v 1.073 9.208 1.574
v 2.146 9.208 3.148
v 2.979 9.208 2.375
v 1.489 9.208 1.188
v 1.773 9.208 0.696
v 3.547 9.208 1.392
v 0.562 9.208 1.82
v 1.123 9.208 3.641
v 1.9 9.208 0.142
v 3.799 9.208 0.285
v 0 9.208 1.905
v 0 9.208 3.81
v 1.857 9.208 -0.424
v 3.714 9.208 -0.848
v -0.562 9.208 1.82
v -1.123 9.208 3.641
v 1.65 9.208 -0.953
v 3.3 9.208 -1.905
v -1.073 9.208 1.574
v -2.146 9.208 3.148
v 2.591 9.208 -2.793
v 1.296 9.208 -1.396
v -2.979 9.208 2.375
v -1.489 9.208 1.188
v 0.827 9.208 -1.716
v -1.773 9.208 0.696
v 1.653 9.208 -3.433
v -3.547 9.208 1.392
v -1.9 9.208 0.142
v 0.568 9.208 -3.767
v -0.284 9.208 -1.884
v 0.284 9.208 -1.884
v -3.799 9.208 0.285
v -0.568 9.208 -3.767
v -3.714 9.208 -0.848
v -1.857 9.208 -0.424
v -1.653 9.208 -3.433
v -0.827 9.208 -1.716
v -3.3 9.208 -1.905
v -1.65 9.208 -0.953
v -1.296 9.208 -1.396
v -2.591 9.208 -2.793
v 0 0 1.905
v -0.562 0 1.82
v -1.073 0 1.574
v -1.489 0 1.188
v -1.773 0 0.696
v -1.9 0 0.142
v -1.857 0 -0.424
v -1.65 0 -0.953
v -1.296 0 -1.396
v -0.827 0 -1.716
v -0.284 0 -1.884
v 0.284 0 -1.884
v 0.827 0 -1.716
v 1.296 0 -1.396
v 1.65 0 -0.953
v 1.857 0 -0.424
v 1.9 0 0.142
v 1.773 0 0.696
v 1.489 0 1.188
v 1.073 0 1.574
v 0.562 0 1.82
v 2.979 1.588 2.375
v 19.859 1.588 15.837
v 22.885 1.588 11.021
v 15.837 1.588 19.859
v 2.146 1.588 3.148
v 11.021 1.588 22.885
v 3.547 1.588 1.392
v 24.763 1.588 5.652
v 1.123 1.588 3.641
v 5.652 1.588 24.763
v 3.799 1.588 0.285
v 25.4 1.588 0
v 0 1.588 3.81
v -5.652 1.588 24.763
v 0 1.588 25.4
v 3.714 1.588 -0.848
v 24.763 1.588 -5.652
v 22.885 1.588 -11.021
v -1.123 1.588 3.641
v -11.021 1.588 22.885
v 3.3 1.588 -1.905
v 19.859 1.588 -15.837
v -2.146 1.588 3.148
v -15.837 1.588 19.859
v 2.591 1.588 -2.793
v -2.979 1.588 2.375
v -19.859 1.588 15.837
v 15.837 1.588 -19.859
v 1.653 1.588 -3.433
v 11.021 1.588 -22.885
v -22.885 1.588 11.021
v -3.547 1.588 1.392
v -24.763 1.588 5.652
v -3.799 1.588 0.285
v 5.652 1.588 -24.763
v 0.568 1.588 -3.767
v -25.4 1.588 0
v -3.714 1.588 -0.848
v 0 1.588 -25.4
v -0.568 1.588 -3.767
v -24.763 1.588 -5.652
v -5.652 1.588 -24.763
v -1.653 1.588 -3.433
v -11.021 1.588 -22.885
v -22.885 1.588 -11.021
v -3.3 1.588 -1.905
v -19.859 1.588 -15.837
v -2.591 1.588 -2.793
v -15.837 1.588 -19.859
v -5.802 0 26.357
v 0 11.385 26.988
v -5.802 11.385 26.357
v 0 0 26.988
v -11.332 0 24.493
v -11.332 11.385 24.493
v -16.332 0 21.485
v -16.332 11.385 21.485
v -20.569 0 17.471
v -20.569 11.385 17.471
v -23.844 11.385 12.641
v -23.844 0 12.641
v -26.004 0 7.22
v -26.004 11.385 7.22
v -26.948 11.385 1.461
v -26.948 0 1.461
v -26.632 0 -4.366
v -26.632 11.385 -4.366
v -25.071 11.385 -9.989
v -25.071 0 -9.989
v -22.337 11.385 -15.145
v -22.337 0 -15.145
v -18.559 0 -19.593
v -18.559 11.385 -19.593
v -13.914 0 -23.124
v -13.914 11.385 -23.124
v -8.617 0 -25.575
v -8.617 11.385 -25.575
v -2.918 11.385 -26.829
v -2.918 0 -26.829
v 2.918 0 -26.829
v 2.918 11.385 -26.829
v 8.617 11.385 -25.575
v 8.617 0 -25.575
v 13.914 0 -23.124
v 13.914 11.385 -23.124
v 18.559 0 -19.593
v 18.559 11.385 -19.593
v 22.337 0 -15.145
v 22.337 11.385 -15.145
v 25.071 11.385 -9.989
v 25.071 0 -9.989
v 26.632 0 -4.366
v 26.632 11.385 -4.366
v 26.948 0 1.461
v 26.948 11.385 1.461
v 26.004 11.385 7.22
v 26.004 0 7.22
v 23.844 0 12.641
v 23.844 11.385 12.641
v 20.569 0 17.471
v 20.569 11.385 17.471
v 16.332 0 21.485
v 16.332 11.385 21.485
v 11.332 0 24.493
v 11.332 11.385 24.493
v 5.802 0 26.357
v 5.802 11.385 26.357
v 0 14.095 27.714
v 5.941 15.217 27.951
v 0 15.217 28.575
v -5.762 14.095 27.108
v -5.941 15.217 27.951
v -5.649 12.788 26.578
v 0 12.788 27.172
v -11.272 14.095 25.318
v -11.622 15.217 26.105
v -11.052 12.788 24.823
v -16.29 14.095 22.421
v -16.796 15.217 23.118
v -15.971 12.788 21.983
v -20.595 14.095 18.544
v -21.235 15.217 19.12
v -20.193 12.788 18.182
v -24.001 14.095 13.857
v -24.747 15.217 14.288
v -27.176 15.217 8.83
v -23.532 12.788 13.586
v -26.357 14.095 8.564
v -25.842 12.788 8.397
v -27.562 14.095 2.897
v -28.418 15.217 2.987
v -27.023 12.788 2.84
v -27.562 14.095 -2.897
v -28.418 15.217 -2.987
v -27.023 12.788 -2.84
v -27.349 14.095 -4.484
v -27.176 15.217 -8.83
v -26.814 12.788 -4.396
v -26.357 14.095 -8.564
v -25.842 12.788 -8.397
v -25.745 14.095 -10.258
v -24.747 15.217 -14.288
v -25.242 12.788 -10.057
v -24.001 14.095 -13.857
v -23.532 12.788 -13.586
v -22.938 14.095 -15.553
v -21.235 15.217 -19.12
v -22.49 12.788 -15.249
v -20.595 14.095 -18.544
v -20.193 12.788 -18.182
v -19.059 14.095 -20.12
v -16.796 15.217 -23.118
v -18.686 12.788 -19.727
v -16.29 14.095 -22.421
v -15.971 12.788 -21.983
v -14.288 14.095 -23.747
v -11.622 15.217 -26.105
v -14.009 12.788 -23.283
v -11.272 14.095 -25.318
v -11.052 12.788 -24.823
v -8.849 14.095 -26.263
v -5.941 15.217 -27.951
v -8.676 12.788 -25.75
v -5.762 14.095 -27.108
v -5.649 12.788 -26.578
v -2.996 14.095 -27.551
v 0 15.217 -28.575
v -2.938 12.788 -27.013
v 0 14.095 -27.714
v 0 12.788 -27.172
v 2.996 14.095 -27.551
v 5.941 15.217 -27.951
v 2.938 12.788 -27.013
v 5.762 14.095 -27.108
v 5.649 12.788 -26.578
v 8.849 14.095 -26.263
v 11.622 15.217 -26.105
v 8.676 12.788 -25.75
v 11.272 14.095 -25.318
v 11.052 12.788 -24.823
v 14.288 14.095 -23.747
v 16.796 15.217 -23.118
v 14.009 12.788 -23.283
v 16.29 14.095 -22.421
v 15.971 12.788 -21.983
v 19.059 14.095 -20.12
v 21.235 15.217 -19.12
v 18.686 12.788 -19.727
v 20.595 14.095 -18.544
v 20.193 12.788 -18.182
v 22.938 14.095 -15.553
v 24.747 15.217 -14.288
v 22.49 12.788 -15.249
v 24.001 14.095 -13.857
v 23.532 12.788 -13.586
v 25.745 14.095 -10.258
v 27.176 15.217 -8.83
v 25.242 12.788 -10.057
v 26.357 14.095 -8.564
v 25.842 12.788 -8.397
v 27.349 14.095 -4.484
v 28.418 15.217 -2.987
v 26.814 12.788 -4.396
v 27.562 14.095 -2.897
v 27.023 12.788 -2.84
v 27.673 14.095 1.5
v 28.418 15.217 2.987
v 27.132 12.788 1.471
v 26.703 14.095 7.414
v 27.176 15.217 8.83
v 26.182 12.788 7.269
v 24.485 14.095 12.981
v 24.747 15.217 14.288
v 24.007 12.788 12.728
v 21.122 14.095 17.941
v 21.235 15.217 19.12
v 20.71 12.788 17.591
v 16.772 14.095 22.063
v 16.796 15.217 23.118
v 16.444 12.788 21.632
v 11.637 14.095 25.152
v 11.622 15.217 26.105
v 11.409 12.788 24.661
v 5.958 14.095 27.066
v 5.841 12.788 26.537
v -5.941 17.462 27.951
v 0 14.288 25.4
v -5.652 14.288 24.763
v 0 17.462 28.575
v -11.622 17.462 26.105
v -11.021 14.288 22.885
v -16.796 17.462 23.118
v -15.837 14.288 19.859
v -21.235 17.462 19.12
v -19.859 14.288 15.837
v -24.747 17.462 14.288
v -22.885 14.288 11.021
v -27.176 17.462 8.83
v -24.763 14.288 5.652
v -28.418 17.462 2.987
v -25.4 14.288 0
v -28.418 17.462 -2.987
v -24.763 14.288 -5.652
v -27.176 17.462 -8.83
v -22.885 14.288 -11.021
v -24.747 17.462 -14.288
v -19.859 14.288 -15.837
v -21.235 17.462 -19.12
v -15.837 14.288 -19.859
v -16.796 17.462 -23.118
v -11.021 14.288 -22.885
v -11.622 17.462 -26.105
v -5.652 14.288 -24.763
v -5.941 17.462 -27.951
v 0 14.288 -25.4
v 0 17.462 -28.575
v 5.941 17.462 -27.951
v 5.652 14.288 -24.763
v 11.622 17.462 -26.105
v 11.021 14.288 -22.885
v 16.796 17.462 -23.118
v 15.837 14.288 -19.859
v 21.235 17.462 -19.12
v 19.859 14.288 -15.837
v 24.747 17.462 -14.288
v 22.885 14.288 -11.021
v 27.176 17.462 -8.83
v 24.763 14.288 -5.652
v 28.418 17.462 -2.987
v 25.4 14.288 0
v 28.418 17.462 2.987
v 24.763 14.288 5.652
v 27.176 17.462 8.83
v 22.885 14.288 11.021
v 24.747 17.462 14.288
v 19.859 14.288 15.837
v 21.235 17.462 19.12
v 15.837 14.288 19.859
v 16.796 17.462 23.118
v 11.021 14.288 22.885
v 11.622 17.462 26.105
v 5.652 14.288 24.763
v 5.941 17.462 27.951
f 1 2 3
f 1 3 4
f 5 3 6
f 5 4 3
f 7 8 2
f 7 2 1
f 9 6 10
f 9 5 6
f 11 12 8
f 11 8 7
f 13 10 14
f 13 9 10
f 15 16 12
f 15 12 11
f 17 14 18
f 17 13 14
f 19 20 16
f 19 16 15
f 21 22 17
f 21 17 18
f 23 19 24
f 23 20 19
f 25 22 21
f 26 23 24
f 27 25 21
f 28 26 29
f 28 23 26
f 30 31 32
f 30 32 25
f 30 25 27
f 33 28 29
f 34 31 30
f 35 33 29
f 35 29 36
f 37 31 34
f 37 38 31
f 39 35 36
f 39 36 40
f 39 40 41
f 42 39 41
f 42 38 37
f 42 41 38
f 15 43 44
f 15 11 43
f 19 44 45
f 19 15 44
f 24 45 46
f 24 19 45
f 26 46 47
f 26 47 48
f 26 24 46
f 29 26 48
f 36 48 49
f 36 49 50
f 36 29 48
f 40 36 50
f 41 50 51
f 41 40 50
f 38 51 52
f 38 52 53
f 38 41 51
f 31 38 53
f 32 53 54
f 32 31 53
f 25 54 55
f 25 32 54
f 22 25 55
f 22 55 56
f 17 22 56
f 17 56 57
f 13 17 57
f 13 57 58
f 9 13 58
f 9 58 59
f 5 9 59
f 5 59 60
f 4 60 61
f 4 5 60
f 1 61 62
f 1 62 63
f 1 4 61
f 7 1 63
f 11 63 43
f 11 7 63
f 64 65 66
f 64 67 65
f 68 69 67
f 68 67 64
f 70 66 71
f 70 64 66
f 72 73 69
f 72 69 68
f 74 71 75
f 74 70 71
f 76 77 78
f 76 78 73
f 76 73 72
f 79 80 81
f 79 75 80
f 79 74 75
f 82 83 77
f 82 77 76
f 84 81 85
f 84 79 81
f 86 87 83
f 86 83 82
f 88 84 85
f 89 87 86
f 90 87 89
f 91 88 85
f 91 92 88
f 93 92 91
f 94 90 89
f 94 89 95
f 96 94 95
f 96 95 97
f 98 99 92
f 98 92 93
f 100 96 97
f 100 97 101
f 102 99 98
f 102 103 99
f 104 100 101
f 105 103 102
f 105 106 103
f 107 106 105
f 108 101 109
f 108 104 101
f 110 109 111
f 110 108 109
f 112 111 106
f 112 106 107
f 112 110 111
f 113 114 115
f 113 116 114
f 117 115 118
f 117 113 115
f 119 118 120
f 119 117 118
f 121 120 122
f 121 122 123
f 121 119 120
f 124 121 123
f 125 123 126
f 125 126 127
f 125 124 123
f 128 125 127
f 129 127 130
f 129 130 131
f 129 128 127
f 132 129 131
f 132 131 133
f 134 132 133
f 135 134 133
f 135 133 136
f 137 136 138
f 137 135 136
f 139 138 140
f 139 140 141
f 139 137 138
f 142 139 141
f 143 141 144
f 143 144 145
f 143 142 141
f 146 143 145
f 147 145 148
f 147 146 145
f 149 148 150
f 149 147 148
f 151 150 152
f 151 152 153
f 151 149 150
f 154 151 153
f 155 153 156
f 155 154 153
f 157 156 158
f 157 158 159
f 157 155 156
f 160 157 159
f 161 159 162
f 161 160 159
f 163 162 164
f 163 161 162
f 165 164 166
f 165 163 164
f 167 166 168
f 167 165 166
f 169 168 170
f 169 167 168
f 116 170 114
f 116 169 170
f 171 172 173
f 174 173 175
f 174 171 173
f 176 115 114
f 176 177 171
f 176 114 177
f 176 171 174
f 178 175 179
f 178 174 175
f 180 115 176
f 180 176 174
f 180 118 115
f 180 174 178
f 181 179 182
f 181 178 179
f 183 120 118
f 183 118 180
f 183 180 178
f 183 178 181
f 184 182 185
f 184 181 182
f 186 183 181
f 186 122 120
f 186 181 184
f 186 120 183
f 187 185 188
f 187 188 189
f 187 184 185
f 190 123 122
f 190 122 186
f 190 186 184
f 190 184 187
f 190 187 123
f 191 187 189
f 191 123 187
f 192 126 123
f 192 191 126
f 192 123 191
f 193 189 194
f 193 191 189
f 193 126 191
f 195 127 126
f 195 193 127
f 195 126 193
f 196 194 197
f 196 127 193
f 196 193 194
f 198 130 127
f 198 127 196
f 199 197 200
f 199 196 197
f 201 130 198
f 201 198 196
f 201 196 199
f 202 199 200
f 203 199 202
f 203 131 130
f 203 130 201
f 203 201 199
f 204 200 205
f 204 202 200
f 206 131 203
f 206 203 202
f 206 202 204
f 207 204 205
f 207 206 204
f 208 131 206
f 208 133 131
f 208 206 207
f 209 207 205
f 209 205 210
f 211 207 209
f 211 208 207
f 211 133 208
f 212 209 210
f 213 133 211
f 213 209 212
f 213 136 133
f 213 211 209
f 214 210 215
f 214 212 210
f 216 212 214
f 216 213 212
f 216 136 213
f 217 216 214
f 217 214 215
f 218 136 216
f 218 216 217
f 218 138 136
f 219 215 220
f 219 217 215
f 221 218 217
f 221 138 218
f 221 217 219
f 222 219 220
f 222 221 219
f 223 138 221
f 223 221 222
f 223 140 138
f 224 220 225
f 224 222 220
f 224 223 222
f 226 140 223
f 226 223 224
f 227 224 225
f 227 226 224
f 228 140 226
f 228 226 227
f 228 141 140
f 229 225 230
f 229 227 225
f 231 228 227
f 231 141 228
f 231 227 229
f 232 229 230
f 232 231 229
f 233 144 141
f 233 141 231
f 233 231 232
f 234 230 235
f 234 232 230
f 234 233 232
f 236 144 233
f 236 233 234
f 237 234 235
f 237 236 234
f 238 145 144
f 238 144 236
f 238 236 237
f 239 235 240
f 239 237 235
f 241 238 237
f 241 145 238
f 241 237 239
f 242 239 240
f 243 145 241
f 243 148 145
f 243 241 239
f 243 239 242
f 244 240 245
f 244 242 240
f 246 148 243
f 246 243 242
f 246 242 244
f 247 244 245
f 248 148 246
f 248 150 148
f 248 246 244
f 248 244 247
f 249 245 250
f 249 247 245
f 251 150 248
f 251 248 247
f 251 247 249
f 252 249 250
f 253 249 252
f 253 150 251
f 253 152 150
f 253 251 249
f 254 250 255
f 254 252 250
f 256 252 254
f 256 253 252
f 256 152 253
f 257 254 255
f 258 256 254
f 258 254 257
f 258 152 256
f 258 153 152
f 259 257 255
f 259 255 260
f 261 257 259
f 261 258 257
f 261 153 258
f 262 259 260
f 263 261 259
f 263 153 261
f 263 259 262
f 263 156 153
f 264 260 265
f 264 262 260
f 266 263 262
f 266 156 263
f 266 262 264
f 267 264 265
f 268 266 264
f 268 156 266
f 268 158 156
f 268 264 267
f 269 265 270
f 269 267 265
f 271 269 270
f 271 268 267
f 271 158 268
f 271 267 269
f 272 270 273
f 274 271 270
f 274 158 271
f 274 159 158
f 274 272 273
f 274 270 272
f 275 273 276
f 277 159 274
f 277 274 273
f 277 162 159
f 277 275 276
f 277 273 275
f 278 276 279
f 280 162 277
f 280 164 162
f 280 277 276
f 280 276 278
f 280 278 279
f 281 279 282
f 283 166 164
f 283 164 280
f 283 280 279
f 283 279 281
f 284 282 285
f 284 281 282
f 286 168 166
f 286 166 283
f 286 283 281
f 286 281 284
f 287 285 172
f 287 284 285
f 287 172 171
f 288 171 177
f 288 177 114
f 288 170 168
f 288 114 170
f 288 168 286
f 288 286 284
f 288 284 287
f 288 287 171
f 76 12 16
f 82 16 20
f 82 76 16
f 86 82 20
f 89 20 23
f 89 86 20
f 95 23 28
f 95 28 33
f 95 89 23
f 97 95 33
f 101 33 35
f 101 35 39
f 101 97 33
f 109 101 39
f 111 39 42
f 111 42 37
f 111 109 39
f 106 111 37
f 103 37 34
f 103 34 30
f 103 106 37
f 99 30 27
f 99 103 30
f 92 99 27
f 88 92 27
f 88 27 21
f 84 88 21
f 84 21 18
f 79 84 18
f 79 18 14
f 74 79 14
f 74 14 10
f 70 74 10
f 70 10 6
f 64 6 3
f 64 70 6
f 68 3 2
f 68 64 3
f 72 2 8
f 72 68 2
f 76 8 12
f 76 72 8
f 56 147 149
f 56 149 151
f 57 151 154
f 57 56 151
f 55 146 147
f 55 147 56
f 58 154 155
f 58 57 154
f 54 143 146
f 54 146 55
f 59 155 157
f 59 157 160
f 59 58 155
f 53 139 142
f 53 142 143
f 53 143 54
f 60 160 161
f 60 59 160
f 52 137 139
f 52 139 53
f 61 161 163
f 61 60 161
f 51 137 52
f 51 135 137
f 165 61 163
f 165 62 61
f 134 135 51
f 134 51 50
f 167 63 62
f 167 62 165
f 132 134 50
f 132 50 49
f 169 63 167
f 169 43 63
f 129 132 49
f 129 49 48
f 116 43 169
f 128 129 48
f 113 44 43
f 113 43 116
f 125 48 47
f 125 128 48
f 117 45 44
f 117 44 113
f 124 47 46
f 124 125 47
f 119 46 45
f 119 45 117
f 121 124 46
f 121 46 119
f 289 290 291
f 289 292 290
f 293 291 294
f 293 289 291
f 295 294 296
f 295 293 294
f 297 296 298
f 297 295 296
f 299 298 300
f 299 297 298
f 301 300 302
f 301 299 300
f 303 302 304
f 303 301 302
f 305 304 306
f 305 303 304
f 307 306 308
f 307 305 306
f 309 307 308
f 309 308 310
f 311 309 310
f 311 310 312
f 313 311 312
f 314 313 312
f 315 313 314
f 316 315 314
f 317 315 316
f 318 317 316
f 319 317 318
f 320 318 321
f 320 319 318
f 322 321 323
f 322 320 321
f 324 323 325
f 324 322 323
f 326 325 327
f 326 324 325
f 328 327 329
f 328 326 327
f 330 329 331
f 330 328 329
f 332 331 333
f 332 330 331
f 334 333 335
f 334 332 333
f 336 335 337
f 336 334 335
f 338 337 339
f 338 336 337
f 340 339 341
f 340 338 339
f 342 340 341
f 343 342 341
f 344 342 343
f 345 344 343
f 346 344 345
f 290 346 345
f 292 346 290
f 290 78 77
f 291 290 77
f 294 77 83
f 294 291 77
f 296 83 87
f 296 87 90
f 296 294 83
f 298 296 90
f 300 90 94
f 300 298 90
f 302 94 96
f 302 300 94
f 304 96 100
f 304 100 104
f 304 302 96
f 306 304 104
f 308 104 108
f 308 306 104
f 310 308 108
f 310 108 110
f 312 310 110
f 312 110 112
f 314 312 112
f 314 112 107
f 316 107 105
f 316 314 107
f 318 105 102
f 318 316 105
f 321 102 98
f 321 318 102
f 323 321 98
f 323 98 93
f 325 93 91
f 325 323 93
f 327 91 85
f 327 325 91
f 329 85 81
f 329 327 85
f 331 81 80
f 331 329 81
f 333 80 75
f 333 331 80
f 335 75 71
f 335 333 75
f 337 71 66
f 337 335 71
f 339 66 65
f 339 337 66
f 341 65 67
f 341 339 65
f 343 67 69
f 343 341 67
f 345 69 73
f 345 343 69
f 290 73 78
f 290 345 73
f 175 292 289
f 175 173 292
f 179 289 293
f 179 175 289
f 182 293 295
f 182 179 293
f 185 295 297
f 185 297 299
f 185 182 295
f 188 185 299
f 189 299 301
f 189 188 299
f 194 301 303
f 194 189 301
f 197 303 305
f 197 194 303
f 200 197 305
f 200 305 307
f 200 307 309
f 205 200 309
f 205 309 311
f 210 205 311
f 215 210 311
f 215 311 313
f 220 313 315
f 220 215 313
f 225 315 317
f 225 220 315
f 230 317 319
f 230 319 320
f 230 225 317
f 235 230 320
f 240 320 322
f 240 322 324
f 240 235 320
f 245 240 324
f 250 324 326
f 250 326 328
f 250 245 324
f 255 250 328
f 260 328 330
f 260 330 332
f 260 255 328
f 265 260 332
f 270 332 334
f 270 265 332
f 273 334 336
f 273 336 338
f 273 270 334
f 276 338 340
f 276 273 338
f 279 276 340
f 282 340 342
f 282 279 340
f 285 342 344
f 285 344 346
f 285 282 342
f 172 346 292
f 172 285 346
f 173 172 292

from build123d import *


with BuildPart() as part:
    # Sketch2 → Revolve1 (revolve)
    with BuildSketch(Plane(origin=(0, 0, 0), x_dir=(0, 0, -1), z_dir=(1, 0, 0)), mode=Mode.PRIVATE) as revolve1_sk:
        with BuildLine():
            Line((1.905, 0), (1.905, 9.2075))
            Line((1.905, 9.2075), (3.81, 9.2075))
            Line((3.81, 9.2075), (3.81, 1.5875))
            Line((3.81, 1.5875), (25.4, 1.5875))
            Line((25.4, 1.5875), (25.4, 14.2875))
            Line((25.4, 14.2875), (28.575, 17.4625))
            Line((28.575, 17.4625), (28.575, 15.21743597))
            ThreePointArc((28.575, 15.21743597), (27.400077808, 13.459040646), (26.9875, 11.384871939))
            Line((26.9875, 11.384871939), (26.9875, 0))
            Line((26.9875, 0), (1.905, 0))
        make_face()
    revolve(revolve1_sk.sketch.rotate(Axis((0, 0, 0), (0, -1, 0)), 180), axis=Axis((0, 0, 0), (0, -1, 0)))


solid = part.part
